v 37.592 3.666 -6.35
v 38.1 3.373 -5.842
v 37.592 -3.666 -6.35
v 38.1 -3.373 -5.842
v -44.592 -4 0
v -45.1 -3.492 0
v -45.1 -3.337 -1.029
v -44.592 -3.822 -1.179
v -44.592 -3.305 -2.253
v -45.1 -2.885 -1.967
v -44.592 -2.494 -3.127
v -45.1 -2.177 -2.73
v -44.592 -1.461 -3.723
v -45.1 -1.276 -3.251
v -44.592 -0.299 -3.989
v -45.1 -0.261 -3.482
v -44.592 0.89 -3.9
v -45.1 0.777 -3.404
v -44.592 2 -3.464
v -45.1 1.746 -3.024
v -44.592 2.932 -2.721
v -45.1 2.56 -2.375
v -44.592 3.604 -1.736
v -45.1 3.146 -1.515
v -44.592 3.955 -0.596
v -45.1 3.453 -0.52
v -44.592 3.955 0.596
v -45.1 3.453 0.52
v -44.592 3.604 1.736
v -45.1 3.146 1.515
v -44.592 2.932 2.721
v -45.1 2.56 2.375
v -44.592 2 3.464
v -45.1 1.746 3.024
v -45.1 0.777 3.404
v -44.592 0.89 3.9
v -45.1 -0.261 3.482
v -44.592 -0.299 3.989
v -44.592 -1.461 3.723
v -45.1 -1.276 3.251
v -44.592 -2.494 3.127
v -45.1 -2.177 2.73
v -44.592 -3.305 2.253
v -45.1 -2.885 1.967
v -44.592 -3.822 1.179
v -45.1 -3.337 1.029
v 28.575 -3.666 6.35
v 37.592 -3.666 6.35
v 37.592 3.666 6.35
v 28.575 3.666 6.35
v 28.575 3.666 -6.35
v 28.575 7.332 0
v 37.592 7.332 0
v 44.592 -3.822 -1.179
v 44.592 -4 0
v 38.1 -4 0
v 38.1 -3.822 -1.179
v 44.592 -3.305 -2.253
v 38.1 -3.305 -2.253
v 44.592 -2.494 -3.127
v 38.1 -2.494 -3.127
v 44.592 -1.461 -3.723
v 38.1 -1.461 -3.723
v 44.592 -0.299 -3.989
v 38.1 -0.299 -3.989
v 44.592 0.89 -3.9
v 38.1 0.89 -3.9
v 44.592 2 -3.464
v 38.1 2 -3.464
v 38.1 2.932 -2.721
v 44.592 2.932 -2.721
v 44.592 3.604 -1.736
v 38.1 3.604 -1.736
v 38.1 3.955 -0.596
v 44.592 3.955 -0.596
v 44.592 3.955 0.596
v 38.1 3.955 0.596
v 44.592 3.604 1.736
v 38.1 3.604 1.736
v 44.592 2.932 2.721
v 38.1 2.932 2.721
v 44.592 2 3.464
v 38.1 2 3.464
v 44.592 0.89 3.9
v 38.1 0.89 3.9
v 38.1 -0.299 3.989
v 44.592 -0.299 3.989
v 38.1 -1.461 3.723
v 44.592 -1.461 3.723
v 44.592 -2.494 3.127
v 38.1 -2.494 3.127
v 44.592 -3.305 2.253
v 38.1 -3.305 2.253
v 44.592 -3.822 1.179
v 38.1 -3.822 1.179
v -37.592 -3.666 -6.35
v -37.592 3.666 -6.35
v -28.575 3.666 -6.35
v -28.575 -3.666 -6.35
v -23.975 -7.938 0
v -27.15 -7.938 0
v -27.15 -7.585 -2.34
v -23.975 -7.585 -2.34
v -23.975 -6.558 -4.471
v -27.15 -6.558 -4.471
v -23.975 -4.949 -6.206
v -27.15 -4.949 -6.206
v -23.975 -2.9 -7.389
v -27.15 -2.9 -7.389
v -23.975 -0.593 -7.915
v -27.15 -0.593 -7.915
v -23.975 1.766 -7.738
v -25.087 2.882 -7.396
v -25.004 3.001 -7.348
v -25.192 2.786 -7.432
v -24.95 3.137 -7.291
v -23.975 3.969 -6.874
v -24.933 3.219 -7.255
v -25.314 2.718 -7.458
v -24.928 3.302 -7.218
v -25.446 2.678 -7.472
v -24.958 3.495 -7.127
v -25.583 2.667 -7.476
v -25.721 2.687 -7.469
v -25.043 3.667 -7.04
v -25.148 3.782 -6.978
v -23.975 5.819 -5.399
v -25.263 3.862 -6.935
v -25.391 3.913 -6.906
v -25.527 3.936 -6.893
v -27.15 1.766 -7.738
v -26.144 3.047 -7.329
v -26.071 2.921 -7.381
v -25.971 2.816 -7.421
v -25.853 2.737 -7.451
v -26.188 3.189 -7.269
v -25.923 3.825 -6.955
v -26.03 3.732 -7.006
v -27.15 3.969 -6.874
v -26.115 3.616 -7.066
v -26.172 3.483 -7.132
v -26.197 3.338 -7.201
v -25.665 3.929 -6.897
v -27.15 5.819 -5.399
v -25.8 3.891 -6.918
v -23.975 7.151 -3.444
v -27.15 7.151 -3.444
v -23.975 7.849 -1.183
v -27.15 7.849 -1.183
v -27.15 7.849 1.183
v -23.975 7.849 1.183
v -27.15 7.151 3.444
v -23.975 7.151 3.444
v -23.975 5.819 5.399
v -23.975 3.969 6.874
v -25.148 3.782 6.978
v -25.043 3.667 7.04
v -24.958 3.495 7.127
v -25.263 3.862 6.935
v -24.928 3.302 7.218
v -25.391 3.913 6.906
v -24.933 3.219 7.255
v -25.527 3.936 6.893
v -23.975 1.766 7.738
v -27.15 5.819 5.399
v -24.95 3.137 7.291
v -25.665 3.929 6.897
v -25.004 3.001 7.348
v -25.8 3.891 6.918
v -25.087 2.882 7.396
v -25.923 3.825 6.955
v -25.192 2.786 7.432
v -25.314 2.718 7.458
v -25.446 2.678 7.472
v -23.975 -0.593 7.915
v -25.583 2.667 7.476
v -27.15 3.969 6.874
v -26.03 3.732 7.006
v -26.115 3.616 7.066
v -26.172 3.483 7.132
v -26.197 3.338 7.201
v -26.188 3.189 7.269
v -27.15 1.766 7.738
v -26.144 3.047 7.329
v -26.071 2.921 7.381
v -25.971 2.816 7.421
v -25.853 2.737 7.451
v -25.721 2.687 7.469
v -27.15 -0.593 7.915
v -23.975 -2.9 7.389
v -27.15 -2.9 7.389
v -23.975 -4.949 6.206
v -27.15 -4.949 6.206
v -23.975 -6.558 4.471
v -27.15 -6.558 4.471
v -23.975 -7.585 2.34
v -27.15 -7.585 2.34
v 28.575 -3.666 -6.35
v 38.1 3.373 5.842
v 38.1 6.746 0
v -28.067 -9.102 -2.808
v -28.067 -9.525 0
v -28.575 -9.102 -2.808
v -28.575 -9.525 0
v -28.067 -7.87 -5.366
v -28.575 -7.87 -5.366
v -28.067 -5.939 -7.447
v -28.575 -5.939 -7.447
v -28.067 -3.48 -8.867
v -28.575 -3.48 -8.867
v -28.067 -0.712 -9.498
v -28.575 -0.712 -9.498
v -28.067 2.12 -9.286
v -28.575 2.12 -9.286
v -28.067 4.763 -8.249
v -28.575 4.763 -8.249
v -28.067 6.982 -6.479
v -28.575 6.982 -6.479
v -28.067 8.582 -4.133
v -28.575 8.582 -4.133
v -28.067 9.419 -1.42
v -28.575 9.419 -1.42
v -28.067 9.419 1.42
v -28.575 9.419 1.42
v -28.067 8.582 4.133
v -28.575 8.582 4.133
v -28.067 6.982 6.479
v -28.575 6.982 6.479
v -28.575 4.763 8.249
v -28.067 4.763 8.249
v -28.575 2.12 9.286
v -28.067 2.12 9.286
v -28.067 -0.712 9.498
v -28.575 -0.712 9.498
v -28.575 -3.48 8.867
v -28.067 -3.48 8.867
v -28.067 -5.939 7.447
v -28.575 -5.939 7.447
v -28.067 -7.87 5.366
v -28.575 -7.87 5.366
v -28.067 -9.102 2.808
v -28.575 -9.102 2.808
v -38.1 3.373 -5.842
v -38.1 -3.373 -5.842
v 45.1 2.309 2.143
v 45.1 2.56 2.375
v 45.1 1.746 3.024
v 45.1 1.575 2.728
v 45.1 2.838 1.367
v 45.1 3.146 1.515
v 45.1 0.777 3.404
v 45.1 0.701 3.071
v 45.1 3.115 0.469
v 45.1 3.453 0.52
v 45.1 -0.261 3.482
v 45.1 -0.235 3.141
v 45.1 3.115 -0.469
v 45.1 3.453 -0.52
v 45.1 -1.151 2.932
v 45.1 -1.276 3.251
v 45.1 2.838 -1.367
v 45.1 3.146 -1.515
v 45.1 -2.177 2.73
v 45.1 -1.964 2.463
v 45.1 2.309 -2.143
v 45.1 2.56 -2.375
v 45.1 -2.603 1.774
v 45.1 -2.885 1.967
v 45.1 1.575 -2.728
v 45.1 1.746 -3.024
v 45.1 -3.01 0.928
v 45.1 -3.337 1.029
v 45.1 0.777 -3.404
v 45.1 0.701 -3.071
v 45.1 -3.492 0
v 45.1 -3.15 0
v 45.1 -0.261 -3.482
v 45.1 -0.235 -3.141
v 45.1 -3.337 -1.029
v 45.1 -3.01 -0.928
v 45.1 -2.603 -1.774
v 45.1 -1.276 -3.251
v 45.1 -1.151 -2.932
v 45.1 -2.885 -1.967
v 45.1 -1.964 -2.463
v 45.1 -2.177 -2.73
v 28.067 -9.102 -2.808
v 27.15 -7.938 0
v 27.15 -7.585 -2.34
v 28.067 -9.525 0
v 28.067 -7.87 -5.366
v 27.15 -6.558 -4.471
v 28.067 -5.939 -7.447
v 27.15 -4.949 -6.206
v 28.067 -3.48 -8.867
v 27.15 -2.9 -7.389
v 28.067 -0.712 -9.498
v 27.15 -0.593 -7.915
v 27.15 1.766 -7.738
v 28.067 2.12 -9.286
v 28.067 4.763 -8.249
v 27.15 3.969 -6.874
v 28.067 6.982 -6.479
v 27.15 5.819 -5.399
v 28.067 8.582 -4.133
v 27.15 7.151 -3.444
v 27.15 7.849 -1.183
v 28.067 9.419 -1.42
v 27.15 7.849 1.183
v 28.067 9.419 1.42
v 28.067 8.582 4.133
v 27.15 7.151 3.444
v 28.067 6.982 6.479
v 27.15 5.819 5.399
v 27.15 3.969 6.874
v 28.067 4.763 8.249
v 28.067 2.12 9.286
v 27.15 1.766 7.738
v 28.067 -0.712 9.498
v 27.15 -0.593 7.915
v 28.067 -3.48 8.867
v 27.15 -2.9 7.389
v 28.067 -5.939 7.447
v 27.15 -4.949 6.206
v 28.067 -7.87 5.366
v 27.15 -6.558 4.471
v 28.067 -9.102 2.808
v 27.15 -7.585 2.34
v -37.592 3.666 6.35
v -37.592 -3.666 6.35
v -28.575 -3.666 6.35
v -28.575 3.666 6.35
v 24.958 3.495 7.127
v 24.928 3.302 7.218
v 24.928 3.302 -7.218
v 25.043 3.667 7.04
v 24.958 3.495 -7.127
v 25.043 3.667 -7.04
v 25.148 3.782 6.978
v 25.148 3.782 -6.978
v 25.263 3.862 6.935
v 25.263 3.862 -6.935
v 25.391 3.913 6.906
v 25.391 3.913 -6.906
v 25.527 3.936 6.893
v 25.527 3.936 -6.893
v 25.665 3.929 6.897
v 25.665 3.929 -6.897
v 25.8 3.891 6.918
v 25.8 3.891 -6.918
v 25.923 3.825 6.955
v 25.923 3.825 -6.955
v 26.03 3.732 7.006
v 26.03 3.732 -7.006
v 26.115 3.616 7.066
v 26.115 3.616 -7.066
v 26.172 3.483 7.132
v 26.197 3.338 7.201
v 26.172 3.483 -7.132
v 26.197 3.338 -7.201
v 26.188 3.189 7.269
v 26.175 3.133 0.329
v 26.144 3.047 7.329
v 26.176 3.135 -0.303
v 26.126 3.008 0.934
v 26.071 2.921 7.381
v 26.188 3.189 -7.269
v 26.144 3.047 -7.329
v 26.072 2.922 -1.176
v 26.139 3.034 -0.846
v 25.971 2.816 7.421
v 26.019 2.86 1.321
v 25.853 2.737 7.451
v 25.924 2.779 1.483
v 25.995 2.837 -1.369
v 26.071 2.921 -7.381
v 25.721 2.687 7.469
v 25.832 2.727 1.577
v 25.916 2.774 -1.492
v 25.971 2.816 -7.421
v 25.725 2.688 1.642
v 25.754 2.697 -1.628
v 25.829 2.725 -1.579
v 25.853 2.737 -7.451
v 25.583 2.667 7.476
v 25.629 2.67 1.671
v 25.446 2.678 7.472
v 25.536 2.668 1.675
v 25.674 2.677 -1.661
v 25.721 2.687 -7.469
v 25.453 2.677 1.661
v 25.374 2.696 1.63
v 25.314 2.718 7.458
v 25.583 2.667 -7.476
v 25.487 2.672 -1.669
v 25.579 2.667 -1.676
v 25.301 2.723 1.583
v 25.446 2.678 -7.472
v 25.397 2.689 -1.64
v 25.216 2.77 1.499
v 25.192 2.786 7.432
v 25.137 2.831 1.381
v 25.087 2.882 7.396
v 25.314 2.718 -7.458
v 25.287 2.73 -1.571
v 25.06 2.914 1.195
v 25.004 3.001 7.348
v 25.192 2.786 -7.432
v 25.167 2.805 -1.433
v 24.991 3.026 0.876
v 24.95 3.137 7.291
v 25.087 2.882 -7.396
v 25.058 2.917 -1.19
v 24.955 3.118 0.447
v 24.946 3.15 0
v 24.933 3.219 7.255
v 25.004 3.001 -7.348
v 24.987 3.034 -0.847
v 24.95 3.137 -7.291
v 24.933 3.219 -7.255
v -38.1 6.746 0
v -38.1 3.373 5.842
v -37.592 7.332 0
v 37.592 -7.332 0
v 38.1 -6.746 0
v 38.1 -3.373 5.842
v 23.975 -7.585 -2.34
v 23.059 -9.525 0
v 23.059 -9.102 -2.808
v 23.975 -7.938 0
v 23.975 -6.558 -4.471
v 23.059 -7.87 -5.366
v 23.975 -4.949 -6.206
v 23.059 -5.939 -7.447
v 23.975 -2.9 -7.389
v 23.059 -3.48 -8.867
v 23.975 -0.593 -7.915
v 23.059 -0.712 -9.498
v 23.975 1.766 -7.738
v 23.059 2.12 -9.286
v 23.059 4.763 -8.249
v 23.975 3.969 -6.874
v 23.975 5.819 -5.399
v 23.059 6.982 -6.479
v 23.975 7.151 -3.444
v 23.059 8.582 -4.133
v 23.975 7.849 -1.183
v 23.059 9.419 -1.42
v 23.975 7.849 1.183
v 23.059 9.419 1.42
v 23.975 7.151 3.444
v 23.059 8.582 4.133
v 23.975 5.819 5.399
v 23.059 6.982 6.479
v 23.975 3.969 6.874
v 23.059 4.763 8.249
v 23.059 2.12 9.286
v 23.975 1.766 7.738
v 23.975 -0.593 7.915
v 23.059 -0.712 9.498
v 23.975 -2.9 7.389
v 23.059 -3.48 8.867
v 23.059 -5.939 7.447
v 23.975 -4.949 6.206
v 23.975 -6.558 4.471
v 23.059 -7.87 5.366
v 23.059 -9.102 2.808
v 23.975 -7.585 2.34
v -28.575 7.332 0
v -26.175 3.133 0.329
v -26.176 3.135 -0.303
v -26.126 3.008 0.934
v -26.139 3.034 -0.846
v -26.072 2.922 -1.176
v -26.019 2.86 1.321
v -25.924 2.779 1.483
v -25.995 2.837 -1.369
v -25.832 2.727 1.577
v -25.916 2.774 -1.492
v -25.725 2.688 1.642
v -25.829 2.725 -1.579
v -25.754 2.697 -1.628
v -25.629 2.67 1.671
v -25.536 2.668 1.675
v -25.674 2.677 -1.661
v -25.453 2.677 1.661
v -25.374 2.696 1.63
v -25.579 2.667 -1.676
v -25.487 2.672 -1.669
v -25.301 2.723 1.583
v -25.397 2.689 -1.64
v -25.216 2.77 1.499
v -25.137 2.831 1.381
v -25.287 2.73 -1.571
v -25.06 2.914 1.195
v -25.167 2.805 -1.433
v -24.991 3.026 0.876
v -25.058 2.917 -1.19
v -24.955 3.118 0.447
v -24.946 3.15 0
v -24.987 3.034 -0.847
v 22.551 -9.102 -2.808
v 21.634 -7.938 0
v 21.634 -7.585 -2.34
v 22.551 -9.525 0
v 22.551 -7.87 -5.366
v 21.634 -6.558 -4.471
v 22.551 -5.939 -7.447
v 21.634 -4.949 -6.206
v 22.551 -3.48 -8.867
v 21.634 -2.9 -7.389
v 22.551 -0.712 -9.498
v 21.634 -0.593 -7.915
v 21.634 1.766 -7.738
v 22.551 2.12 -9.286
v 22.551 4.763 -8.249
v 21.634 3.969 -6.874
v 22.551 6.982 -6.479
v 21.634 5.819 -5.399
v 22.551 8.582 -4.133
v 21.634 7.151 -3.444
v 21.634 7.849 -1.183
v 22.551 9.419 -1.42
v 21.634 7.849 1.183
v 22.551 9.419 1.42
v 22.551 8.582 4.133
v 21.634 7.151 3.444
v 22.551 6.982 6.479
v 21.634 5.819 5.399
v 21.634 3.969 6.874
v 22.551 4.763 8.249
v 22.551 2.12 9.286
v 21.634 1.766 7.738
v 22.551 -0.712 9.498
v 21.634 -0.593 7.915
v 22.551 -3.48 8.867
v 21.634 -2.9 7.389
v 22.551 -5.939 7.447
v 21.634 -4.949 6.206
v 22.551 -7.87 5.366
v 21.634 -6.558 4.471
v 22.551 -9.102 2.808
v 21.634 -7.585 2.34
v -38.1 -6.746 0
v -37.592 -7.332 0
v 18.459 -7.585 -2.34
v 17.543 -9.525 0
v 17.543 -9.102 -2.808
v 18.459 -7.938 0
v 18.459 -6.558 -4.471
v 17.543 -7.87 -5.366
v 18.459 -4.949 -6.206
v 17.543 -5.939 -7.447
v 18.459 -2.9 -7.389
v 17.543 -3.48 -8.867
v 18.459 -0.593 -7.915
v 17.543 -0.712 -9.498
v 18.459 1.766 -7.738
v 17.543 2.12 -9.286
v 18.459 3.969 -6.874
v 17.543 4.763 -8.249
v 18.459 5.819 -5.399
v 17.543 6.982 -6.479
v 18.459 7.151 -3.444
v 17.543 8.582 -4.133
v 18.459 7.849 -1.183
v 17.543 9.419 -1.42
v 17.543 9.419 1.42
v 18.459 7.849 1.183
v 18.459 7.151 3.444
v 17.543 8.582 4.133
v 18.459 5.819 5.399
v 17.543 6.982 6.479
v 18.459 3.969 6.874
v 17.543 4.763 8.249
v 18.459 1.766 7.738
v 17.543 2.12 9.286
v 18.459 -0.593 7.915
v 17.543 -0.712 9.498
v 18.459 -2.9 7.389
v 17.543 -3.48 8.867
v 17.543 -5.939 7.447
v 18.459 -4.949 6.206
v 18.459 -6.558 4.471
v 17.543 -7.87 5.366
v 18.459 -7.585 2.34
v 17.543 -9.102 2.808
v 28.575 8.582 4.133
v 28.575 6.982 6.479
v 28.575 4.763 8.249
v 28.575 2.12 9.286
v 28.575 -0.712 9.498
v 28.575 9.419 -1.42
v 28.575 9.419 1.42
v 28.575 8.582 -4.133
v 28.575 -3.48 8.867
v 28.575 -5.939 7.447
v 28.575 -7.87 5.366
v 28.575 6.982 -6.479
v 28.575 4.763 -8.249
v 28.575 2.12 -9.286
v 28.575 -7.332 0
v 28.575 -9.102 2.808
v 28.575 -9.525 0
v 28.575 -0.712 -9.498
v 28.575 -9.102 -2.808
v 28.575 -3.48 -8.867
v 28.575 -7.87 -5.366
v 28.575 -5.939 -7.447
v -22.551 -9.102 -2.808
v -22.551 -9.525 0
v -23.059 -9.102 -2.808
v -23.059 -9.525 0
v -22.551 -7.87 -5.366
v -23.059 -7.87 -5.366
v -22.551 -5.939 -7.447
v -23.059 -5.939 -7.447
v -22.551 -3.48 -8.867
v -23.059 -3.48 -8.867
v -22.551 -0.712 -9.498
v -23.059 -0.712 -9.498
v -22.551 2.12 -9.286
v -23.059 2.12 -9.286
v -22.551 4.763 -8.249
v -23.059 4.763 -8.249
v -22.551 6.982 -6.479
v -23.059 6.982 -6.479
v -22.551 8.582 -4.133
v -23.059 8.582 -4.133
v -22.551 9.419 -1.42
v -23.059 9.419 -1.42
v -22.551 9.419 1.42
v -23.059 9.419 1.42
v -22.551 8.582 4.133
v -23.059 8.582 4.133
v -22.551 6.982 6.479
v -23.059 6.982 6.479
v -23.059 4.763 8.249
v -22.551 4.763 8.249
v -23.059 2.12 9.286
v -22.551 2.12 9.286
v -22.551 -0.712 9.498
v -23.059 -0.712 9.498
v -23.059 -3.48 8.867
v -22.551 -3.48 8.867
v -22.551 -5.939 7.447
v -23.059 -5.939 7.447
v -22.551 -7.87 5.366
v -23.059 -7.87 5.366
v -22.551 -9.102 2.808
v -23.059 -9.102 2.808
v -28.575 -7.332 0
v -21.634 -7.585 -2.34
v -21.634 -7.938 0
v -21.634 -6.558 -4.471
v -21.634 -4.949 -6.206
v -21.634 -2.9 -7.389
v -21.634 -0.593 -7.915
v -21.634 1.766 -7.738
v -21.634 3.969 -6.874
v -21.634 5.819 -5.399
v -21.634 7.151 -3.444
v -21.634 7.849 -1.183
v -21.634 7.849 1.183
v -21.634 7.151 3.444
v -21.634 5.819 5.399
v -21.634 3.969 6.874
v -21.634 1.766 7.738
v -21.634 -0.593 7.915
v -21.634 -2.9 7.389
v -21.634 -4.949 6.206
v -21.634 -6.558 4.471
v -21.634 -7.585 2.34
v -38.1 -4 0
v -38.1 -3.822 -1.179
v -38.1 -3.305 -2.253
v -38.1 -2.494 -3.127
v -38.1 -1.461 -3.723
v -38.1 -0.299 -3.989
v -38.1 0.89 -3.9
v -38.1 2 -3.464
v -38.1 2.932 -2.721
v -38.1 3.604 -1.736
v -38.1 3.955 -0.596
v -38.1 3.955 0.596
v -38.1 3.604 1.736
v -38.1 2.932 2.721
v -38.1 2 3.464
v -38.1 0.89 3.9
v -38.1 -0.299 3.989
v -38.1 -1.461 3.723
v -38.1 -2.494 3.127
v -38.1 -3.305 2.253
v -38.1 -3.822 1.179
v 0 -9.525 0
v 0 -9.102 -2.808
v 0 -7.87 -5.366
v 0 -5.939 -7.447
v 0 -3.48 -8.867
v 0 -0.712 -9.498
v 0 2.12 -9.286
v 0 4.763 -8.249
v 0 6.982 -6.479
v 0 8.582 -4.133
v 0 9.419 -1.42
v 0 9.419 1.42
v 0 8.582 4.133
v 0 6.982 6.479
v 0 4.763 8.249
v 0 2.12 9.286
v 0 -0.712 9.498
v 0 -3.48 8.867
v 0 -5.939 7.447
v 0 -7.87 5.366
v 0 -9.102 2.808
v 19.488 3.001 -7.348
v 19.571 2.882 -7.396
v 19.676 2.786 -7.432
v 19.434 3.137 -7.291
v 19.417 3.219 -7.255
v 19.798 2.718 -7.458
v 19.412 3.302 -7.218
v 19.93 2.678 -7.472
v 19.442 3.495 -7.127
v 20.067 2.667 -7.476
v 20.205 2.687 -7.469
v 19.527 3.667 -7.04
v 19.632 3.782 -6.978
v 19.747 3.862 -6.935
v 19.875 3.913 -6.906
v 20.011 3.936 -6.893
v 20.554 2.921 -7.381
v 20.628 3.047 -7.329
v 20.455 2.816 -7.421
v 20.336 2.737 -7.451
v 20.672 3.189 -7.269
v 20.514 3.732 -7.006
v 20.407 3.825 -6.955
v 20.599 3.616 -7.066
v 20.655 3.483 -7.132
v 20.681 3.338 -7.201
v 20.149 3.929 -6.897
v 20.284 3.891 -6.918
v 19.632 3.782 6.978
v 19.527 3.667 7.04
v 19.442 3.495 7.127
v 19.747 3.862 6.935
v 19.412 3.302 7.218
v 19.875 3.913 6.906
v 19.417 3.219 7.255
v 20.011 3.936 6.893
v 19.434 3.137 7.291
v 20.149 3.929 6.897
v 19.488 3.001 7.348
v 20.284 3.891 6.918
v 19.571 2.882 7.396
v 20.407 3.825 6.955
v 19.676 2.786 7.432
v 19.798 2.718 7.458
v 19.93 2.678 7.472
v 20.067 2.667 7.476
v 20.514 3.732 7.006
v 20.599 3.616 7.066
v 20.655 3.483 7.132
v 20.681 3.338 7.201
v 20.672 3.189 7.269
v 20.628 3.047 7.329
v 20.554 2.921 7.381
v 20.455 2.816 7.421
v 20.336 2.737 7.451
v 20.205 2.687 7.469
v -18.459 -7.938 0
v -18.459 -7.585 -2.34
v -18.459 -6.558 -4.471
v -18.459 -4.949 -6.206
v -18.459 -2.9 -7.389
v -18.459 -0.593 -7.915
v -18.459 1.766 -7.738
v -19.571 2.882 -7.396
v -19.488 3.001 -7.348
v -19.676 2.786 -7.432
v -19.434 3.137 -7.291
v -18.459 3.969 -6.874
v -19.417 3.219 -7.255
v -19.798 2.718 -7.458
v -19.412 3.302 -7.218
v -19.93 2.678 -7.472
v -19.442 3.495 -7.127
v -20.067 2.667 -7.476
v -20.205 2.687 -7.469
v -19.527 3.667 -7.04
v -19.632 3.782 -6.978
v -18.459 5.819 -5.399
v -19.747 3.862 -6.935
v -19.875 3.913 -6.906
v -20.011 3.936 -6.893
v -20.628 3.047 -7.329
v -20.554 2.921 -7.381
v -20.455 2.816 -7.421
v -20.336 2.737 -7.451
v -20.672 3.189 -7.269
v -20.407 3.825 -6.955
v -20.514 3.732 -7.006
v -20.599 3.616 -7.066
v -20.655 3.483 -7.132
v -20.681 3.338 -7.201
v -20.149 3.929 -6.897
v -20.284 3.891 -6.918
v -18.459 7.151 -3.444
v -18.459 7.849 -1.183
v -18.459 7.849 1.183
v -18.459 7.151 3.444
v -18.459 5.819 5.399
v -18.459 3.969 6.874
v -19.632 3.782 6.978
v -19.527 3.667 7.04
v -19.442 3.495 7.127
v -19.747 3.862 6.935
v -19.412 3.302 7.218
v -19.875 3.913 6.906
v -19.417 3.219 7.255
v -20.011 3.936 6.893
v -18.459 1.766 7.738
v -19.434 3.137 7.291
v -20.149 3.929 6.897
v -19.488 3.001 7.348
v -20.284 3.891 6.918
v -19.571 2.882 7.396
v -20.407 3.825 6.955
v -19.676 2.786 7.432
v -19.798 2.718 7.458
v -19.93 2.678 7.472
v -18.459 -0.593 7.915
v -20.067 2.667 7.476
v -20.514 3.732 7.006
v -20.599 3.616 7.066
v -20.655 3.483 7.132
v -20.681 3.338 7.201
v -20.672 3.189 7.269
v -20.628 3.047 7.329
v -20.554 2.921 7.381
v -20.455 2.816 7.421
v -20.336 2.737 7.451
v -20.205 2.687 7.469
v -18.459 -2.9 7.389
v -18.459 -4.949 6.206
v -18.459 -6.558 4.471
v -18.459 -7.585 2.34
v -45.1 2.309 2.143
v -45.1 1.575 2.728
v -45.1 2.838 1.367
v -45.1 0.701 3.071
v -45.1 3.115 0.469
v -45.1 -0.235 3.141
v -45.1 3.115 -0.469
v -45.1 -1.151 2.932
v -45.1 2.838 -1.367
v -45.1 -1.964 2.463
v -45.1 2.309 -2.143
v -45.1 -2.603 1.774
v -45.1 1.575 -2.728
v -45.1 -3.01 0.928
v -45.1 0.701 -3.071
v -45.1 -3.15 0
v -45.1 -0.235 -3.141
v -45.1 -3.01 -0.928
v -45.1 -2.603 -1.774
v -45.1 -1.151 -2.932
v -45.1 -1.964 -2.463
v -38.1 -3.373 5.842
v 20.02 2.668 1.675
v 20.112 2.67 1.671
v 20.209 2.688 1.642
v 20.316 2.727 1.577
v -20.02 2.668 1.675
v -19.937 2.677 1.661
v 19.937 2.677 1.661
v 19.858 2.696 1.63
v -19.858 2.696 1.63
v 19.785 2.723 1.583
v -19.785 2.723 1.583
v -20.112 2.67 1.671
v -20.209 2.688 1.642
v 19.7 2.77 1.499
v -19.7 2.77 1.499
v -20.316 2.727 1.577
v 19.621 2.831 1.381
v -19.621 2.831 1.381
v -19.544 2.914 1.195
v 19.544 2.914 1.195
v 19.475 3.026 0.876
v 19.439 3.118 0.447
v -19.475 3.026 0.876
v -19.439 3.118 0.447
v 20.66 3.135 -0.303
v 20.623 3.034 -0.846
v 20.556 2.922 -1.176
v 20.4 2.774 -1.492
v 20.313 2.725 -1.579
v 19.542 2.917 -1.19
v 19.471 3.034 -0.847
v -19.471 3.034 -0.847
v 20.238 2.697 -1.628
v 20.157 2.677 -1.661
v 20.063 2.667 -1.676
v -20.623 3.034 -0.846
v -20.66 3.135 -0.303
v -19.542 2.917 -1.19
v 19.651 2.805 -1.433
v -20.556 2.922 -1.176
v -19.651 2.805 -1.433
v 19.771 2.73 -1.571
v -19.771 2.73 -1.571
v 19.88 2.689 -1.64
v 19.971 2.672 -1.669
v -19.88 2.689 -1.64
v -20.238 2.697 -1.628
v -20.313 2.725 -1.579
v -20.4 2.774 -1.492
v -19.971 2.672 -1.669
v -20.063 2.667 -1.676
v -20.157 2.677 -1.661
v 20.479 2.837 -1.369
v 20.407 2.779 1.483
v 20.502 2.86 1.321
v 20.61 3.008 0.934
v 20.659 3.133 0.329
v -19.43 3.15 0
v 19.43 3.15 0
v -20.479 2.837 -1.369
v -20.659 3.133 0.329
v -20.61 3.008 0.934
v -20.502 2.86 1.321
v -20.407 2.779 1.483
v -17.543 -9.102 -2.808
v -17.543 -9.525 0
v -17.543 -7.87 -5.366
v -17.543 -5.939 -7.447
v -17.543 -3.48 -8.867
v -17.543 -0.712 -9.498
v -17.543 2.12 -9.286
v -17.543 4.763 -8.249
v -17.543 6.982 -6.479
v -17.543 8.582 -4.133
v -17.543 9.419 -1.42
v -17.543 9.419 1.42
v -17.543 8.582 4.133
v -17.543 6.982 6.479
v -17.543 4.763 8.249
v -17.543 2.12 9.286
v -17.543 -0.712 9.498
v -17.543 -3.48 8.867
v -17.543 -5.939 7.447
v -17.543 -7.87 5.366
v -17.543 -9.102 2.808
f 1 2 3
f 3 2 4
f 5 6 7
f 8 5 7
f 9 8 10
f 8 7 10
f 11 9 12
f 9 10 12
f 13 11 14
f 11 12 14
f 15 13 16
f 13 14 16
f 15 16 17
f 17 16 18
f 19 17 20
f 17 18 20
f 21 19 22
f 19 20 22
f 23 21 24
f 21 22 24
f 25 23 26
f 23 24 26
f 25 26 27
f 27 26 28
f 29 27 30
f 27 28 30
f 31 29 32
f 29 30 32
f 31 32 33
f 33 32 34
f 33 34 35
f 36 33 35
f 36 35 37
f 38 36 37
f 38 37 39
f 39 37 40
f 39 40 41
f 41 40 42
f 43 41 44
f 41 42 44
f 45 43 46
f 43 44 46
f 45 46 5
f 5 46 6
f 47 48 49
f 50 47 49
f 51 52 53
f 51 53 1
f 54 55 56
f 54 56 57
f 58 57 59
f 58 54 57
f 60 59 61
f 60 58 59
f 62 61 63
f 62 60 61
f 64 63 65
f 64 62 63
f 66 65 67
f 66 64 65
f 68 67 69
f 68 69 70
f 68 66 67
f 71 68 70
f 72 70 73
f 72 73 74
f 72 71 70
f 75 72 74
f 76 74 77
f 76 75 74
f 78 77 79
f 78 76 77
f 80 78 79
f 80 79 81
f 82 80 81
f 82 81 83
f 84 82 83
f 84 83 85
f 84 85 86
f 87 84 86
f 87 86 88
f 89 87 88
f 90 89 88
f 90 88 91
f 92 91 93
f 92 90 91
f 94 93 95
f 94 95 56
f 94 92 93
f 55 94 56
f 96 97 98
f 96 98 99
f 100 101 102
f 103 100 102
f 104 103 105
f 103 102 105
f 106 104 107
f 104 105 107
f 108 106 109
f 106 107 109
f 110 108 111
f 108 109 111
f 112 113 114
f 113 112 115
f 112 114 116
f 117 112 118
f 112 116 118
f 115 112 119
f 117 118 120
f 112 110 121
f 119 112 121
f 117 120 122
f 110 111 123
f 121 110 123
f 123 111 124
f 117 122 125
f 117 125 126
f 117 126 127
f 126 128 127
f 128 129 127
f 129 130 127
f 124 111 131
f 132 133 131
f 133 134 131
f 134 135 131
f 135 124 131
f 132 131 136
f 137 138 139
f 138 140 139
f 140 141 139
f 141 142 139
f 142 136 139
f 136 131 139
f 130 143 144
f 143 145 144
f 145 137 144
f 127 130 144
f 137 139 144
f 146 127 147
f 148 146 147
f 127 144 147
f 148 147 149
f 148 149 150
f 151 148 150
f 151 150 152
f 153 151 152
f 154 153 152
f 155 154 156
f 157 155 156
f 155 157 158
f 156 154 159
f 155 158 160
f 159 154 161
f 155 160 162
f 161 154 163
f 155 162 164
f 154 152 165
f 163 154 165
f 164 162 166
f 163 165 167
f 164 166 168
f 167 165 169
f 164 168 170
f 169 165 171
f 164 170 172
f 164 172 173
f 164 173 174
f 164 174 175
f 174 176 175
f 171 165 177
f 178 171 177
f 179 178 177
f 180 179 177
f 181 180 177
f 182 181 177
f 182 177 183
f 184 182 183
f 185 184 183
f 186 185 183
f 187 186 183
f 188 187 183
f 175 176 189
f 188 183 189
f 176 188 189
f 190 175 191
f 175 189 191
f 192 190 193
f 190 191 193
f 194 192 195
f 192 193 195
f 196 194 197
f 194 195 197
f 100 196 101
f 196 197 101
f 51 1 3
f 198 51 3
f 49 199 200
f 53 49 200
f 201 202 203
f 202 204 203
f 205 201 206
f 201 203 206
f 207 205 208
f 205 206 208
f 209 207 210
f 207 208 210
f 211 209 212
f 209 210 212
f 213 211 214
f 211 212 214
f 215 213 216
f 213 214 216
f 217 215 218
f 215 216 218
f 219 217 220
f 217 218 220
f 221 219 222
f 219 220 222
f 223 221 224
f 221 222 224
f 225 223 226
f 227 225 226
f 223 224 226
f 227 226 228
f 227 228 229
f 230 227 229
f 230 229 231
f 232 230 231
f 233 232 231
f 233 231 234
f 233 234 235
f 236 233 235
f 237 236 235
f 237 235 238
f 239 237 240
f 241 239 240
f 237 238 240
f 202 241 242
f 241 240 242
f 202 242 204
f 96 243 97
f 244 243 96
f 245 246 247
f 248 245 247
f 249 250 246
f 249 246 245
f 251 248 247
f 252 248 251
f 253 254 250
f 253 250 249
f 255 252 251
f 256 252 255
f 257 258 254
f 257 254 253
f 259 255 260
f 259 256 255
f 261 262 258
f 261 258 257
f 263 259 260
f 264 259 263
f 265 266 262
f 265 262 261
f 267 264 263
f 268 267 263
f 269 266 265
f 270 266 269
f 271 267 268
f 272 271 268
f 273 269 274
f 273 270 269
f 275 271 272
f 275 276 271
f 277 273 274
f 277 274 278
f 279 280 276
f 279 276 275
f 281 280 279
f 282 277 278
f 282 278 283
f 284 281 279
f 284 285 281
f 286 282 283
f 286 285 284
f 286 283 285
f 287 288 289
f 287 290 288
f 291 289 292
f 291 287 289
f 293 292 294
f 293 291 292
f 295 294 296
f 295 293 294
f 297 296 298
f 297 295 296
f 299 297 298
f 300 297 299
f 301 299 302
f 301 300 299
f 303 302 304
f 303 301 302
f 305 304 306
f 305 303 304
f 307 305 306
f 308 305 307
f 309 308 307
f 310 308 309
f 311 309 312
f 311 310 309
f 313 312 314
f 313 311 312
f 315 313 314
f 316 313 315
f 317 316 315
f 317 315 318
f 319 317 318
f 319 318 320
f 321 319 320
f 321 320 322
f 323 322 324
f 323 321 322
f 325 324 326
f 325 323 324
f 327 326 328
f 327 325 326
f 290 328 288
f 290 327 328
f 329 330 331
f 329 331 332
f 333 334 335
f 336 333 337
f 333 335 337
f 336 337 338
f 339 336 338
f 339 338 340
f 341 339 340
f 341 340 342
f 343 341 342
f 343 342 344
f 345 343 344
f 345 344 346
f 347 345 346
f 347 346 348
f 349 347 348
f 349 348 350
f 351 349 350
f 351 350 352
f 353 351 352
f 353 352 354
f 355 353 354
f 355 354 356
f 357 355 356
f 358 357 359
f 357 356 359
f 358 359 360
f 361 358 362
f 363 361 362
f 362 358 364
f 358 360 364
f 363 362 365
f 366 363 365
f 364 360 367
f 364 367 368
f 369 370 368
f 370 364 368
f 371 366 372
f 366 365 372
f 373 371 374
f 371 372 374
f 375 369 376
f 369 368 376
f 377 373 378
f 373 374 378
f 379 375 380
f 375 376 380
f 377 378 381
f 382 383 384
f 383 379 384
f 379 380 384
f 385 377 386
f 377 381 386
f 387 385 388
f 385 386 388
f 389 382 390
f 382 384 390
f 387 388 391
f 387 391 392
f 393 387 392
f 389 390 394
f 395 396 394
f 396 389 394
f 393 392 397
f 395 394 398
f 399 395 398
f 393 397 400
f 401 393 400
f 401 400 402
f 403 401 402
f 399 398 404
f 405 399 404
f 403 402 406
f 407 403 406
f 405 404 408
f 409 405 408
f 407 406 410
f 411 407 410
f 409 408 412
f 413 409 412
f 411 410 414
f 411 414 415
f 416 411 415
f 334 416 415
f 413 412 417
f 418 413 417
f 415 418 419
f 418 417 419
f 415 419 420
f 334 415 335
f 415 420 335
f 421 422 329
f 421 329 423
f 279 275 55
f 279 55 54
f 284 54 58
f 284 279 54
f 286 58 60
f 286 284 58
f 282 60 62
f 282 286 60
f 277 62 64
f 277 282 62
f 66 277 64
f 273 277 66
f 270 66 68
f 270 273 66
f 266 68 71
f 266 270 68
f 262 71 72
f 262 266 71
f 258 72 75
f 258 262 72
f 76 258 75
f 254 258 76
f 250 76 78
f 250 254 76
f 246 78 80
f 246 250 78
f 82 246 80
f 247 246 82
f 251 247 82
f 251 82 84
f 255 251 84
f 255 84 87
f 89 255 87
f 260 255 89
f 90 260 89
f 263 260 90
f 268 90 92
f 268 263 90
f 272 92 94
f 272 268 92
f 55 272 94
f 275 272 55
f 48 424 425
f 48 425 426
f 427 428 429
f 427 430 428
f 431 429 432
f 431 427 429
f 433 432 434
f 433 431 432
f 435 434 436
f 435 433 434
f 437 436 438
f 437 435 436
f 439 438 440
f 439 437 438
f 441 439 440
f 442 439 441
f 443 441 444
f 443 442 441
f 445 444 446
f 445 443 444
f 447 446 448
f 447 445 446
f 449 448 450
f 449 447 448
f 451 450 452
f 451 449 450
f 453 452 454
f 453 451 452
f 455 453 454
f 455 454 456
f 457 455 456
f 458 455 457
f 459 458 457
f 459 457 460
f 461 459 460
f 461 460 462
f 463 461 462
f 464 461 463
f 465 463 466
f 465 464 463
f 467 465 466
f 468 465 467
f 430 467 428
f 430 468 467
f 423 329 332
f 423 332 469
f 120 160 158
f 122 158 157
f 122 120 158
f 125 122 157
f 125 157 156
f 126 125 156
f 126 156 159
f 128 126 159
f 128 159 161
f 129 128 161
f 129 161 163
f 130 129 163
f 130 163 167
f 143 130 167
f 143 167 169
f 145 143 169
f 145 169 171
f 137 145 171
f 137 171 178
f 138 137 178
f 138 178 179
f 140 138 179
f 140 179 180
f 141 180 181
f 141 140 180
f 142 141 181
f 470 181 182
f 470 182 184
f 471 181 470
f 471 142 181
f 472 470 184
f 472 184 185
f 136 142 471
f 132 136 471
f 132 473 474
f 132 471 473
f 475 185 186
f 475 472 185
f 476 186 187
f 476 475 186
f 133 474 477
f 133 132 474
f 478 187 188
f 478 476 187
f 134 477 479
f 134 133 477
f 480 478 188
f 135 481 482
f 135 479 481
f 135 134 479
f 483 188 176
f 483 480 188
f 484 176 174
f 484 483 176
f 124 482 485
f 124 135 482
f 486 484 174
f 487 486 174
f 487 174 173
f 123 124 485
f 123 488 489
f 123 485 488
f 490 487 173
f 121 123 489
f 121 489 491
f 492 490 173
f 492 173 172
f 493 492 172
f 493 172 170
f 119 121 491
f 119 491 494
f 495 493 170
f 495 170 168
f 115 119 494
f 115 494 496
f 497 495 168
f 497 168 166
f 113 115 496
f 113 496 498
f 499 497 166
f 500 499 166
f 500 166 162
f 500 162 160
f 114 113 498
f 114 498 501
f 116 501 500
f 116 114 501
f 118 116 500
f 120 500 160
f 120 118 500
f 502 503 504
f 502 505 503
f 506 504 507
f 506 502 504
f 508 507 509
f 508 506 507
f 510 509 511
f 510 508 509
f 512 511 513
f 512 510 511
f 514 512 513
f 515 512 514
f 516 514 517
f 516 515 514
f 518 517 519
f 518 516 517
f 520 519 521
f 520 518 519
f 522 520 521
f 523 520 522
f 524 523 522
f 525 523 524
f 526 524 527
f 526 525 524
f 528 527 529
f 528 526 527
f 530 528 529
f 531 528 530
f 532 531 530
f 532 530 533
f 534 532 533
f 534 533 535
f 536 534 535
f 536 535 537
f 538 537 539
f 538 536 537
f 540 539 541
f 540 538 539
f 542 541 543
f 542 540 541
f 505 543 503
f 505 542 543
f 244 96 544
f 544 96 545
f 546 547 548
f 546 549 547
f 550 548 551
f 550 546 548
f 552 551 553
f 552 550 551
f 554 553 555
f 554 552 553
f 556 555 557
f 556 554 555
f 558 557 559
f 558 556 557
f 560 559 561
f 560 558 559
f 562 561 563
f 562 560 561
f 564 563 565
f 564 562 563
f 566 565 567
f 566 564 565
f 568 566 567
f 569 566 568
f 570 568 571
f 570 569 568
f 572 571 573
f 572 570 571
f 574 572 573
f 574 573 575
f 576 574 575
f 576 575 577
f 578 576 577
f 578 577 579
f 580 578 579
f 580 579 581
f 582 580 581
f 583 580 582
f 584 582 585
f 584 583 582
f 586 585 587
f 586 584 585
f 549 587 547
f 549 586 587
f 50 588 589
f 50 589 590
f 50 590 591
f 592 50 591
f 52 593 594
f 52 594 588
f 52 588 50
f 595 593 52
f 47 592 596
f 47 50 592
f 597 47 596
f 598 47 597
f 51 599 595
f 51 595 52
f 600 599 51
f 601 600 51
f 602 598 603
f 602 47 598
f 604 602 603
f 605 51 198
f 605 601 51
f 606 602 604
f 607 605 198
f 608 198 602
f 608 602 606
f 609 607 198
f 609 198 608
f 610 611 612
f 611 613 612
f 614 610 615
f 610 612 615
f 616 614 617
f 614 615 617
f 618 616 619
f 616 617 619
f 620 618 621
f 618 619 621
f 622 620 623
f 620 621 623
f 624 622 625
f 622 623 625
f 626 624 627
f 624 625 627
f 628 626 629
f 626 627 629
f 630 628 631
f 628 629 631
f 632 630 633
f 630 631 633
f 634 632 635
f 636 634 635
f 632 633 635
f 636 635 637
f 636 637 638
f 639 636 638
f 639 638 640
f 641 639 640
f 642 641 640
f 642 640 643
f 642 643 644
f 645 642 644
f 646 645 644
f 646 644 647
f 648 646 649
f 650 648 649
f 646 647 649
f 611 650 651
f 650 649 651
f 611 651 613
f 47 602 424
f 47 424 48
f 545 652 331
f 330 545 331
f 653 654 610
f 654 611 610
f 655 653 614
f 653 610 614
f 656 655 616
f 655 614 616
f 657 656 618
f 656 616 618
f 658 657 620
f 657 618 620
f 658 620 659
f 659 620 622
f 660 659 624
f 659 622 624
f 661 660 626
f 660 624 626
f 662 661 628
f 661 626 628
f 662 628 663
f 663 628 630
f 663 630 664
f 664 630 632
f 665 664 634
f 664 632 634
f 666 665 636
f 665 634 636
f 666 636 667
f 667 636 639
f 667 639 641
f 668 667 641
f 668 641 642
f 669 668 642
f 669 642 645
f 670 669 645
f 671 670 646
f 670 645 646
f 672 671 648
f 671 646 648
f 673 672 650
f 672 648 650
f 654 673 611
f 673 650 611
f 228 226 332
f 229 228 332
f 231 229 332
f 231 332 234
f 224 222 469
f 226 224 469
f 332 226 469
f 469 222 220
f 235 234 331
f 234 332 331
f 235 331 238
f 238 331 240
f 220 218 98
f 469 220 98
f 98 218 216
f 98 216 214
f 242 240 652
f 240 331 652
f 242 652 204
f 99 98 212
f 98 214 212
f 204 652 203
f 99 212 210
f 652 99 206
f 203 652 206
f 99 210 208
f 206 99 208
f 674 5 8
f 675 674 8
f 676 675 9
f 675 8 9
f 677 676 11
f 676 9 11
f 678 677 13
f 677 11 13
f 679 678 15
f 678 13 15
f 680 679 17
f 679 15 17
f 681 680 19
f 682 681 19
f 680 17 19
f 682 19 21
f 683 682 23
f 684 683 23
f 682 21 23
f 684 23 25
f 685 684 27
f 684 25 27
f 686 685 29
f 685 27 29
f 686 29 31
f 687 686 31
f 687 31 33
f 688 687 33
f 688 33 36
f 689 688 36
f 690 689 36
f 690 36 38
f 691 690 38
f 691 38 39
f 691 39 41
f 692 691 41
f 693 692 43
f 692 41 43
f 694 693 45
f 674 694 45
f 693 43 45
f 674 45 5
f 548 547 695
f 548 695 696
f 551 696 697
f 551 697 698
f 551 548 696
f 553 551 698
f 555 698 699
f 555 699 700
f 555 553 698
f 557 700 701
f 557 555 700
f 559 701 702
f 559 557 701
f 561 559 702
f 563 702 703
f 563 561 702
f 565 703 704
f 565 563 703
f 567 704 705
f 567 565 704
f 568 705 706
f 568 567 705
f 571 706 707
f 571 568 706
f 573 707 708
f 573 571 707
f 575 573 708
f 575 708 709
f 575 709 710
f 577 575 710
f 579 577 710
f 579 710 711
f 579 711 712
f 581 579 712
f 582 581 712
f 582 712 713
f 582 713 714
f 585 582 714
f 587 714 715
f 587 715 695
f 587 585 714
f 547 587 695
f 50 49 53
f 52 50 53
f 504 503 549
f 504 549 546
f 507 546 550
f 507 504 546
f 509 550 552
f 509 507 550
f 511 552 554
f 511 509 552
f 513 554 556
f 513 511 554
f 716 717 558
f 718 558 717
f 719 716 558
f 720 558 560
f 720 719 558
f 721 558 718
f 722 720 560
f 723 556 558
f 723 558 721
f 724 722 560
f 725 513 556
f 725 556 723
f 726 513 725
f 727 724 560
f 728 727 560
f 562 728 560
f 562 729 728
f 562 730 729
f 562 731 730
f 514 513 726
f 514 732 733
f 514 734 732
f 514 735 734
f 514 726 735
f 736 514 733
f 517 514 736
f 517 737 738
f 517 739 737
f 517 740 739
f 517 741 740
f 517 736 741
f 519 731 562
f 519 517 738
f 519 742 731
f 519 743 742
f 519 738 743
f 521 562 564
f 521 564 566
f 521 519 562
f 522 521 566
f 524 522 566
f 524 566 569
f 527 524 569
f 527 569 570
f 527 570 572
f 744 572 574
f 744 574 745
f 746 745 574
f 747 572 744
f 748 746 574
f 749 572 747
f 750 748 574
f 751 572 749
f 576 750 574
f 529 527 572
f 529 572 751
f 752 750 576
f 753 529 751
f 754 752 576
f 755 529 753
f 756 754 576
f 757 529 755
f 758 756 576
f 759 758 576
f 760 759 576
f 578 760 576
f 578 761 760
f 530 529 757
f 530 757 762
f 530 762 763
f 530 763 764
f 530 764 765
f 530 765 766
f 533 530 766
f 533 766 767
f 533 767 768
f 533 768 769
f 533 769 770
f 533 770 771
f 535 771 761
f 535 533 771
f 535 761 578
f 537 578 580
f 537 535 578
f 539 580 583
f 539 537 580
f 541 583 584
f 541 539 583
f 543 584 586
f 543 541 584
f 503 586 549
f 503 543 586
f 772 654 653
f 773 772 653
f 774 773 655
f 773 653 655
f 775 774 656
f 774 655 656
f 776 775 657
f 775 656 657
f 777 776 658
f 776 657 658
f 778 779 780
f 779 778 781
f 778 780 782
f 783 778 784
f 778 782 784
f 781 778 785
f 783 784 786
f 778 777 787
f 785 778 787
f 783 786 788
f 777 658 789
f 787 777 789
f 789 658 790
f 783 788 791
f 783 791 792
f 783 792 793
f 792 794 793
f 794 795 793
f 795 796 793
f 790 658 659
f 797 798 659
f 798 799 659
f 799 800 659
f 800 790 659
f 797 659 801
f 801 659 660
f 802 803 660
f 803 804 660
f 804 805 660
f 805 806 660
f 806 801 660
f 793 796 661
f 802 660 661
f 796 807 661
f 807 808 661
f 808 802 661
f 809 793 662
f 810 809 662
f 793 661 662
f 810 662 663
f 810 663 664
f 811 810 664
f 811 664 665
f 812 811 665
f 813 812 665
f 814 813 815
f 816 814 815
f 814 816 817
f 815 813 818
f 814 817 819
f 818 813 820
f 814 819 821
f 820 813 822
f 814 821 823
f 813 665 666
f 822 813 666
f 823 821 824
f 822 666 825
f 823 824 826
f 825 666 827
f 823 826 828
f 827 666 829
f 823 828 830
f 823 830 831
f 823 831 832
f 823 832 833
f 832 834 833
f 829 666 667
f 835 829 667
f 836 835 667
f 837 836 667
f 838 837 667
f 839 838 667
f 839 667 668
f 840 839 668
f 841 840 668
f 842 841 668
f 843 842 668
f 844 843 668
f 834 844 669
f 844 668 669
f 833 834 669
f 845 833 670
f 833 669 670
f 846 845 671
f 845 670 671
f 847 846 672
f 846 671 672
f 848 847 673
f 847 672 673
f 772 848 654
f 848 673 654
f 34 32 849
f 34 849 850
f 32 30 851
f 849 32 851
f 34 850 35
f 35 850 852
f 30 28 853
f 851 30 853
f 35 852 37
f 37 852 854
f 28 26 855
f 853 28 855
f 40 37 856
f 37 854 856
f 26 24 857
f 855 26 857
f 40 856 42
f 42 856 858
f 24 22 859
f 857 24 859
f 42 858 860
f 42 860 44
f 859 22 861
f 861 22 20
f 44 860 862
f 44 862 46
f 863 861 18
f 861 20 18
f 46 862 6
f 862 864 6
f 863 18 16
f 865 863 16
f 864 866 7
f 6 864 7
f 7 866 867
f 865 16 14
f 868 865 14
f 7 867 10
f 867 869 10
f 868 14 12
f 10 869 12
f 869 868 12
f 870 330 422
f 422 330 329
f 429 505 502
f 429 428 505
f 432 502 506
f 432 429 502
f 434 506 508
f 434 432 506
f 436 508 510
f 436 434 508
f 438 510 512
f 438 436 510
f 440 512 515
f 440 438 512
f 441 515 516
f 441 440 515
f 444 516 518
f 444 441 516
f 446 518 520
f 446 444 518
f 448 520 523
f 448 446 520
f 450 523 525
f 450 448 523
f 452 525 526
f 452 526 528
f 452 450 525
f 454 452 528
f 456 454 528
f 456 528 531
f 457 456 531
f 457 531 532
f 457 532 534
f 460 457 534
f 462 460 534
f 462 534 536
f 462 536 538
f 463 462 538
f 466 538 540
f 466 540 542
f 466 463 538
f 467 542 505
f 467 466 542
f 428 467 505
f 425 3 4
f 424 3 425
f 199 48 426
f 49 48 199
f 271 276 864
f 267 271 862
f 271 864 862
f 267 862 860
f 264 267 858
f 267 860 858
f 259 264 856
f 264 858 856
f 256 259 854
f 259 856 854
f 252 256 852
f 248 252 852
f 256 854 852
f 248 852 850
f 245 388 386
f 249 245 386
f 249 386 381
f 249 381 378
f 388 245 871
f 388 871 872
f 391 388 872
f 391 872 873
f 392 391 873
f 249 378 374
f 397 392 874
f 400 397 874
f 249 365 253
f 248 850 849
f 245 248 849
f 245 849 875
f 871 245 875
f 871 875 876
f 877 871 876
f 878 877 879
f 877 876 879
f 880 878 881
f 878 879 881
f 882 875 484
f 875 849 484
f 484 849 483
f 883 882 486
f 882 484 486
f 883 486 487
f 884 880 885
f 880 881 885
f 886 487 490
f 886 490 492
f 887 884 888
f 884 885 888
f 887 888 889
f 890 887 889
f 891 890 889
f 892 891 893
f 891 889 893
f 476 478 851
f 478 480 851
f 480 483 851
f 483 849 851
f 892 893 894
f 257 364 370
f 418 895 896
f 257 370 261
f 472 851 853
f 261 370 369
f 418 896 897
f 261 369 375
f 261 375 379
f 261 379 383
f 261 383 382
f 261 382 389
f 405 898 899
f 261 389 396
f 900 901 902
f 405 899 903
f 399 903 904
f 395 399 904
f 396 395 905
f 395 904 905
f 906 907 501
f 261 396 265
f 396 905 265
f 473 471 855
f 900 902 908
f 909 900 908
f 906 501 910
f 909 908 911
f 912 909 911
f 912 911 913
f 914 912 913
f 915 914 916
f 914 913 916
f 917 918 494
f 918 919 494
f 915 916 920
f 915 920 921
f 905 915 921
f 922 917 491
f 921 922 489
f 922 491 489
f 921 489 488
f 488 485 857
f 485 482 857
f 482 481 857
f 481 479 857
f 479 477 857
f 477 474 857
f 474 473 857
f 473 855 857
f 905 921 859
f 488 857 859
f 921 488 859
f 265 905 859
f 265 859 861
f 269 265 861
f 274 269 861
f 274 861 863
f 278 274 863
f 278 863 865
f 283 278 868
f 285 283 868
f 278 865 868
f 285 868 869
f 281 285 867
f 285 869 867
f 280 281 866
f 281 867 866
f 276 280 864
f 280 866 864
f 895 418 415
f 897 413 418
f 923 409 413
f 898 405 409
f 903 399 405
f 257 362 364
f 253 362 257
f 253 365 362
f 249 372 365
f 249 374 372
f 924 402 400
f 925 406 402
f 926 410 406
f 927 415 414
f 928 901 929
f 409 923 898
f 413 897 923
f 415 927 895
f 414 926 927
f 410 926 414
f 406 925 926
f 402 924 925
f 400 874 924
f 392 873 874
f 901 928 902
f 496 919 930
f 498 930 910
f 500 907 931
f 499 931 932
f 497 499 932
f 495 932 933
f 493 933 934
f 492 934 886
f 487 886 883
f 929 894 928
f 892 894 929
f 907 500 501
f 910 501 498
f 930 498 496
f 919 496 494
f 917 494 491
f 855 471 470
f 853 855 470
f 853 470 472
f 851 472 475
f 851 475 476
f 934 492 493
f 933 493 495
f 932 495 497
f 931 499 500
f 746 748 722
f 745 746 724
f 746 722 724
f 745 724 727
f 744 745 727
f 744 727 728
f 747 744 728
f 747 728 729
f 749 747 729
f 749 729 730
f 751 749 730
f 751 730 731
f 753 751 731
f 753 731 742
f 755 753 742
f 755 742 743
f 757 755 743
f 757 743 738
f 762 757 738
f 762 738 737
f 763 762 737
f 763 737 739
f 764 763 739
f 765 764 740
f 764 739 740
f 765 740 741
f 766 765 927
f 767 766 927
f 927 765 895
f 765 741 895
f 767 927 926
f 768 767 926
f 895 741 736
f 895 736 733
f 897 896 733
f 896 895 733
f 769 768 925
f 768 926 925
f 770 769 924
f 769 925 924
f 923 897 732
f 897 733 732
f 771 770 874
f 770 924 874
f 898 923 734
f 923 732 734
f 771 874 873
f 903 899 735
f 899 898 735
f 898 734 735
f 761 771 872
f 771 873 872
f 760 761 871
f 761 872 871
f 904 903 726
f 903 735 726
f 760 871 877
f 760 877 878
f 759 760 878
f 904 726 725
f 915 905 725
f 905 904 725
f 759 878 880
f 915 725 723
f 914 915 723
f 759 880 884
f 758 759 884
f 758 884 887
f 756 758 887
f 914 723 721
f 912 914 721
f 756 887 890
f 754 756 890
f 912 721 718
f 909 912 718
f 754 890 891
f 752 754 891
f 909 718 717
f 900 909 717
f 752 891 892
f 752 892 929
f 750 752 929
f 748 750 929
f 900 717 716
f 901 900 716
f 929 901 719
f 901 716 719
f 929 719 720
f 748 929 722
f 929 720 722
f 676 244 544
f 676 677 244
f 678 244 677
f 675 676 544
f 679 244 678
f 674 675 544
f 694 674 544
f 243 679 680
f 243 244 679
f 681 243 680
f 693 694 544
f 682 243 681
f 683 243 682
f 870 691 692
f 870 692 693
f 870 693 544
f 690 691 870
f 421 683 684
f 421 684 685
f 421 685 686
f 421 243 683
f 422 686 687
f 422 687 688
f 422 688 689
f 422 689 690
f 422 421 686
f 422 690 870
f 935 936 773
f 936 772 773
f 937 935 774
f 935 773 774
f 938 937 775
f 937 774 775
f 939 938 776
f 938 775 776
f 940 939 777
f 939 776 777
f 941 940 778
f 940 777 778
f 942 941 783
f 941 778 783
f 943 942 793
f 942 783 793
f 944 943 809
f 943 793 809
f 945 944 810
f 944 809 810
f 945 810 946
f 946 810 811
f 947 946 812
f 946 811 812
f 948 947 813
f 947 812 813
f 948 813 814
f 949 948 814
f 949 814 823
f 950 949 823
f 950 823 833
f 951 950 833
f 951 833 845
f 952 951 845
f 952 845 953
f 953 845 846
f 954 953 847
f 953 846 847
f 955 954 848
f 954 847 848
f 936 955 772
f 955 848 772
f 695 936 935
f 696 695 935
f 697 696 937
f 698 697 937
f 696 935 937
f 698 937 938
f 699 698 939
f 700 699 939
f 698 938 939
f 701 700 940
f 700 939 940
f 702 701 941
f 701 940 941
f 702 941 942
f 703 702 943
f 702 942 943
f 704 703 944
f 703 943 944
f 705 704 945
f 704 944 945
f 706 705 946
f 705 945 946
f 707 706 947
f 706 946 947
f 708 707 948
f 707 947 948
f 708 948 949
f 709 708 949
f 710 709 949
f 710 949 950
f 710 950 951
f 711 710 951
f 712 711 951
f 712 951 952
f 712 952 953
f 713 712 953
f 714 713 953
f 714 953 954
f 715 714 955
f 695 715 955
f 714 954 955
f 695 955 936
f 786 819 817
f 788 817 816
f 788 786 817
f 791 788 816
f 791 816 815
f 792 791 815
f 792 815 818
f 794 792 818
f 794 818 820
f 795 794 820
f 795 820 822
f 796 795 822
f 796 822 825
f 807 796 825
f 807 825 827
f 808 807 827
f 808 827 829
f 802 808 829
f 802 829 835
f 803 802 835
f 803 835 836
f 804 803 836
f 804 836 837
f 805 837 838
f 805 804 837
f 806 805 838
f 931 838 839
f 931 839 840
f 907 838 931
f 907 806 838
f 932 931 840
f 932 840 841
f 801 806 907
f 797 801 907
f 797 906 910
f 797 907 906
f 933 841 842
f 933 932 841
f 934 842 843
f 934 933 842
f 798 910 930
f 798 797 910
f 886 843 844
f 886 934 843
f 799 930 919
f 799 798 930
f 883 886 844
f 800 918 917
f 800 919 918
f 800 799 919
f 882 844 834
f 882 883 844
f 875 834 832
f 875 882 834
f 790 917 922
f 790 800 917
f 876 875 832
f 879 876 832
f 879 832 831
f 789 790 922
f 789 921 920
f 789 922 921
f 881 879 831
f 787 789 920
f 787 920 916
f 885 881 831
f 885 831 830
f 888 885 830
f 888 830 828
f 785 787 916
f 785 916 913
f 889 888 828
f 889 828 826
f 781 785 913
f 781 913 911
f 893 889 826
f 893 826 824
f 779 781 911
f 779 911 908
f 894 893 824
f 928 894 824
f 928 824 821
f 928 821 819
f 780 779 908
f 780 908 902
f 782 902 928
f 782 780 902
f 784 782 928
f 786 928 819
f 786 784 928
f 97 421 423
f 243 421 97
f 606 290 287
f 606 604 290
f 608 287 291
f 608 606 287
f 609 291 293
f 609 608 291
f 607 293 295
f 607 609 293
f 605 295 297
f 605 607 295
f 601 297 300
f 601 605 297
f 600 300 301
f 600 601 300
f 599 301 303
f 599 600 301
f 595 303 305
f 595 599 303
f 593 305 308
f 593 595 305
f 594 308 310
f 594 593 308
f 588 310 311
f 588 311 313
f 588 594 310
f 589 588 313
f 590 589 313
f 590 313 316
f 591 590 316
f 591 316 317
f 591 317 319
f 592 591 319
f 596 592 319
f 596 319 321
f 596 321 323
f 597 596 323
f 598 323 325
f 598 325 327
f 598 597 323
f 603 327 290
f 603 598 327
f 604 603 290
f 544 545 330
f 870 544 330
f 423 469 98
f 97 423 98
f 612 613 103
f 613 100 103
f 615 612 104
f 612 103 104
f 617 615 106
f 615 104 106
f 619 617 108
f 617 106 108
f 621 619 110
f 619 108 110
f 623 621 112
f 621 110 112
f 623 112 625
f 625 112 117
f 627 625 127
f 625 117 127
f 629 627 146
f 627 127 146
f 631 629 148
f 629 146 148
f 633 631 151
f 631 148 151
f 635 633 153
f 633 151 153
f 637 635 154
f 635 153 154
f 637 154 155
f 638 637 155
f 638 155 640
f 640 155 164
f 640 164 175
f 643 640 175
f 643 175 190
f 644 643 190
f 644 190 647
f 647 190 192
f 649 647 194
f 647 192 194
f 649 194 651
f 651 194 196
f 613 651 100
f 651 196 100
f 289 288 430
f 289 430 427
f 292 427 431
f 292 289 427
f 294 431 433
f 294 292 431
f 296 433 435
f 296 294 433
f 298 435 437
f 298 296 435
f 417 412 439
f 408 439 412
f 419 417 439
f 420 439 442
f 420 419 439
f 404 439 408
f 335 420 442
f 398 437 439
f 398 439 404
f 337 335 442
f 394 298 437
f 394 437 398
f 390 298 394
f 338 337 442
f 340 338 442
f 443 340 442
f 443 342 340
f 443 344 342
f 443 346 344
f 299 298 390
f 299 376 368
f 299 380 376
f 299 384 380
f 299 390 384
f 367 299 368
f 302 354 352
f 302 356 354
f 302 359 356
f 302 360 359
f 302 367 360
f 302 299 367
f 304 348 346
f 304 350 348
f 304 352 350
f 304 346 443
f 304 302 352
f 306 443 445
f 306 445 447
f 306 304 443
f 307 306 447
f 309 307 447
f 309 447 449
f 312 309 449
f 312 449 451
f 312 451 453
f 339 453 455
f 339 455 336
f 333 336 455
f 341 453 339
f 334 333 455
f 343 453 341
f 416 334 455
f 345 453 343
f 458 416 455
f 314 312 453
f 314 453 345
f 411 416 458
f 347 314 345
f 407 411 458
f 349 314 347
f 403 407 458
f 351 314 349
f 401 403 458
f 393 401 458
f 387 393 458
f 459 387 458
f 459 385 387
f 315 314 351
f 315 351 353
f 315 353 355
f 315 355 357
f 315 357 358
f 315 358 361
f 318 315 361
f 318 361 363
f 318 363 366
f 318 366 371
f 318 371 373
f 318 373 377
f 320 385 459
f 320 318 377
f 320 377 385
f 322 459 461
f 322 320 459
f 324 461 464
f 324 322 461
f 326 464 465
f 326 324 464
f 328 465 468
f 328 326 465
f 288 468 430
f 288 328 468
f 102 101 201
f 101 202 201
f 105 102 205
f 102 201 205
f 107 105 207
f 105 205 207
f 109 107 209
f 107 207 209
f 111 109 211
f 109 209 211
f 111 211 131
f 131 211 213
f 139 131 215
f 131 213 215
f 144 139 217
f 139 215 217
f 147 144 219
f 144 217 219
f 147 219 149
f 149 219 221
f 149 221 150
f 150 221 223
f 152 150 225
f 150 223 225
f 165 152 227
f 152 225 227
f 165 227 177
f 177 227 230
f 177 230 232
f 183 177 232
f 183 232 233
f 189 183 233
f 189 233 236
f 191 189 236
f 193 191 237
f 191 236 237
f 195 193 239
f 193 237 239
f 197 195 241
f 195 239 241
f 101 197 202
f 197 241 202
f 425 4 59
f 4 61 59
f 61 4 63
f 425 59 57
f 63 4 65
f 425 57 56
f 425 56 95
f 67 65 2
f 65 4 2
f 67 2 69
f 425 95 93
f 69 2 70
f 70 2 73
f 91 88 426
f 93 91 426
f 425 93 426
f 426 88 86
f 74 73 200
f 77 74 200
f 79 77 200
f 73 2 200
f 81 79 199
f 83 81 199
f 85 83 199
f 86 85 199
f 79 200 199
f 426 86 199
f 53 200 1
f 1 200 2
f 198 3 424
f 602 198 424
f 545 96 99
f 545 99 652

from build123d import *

# Parameters (mm, degrees)
BOSS_EXTRUDE4_DEPTH     = 9.525
CUT_EXTRUDE1_DEPTH      = 48.068686512
CUT_EXTRUDE1_DEPTH_BACK = 48.068686512
SKETCH6_R               = 0.635
CHAMFER2_SIZE           = 0.508
CHAMFER3_SIZE           = 0.508
SKETCH7_R               = 3.149999923
CUT_EXTRUDE2_DEPTH      = 92.200280975


with BuildPart() as part:
    # Sketch1 → Revolve1 (revolve)
    with BuildSketch(Plane.XY, mode=Mode.PRIVATE) as revolve1_sk:
        Polygon((-27.150456448, 7.9375), (-28.067, 9.525), (-28.575, 9.525), (-28.575, 4.254000001), (-38.1, 4.254000001), (-38.1, 4.000000001), (-45.1, 4.000000001), (-45.1, 1.599999975), (-35.275, 1.599999975), (-33.675000025, 0), (-28.575, 0), (0, 0), (0, 9.525), (-17.542825791, 9.525), (-18.459369343, 7.9375), (-21.634369343, 7.9375), (-22.550912895, 9.525), (-23.058912895, 9.525), (-23.975456448, 7.9375), align=None)
    revolve(revolve1_sk.sketch.rotate(Axis((-38.1, 0, 0), (1, 0, 0)), 180), axis=Axis((-38.1, 0, 0), (1, 0, 0)))

    # Sketch4 → Boss-Extrude4 (add)
    with BuildSketch(Plane.ZY.offset(28.575)):
        Polygon((0, 7.332348419), (-6.35, 3.666174209), (-6.35, -3.666174209), (0, -7.332348419), (6.35, -3.666174209), (6.35, 3.666174209), align=None)
    extrude(amount=BOSS_EXTRUDE4_DEPTH)

    # Sketch6 → Cut-Extrude1 (cut, two sides: drawn at the far end of the back side and taken through both)
    with BuildSketch(Plane.XY.offset(-CUT_EXTRUDE1_DEPTH_BACK)):
        with Locations((-25.562956448, 3.302)):
            Circle(SKETCH6_R)
        with Locations((-20.046869343, 3.302)):
            Circle(SKETCH6_R)
    extrude(amount=CUT_EXTRUDE1_DEPTH + CUT_EXTRUDE1_DEPTH_BACK, mode=Mode.SUBTRACT)

    # Chamfer2
    chamfer2_edges = [part.edges().sort_by_distance(p)[0] for p in [
        (-38.1, 0, 6.35),
        (-38.1, -5.499261314, 3.175),
        (-38.1, -5.499261314, -3.175),
        (-38.1, 0, -6.35),
        (-38.1, 5.499261314, -3.175),
        (-38.1, 5.499261314, 3.175),
    ]]
    chamfer(chamfer2_edges, length=CHAMFER2_SIZE)

    # Chamfer3
    chamfer3_edges = [part.edges().sort_by_distance(p)[0] for p in [
        (-45.1, 4.000000001, 0),
    ]]
    chamfer(chamfer3_edges, length=CHAMFER3_SIZE)

    # Mirror2: part across plane


with BuildPart() as part_1:
    add(part.part)
    add(part.part.mirror(Plane(origin=(0, 0, 0), x_dir=(0, 0, 1), z_dir=(1, 0, 0))))

    # Sketch7 → Cut-Extrude2 (cut, through all)
    with BuildSketch(Plane.ZY.offset(45.1)):
        with Locations(Location((0, 0, 0), (0, 0, 270))):
            Circle(SKETCH7_R)
    extrude(amount=-CUT_EXTRUDE2_DEPTH, mode=Mode.SUBTRACT)


solid = part_1.part
